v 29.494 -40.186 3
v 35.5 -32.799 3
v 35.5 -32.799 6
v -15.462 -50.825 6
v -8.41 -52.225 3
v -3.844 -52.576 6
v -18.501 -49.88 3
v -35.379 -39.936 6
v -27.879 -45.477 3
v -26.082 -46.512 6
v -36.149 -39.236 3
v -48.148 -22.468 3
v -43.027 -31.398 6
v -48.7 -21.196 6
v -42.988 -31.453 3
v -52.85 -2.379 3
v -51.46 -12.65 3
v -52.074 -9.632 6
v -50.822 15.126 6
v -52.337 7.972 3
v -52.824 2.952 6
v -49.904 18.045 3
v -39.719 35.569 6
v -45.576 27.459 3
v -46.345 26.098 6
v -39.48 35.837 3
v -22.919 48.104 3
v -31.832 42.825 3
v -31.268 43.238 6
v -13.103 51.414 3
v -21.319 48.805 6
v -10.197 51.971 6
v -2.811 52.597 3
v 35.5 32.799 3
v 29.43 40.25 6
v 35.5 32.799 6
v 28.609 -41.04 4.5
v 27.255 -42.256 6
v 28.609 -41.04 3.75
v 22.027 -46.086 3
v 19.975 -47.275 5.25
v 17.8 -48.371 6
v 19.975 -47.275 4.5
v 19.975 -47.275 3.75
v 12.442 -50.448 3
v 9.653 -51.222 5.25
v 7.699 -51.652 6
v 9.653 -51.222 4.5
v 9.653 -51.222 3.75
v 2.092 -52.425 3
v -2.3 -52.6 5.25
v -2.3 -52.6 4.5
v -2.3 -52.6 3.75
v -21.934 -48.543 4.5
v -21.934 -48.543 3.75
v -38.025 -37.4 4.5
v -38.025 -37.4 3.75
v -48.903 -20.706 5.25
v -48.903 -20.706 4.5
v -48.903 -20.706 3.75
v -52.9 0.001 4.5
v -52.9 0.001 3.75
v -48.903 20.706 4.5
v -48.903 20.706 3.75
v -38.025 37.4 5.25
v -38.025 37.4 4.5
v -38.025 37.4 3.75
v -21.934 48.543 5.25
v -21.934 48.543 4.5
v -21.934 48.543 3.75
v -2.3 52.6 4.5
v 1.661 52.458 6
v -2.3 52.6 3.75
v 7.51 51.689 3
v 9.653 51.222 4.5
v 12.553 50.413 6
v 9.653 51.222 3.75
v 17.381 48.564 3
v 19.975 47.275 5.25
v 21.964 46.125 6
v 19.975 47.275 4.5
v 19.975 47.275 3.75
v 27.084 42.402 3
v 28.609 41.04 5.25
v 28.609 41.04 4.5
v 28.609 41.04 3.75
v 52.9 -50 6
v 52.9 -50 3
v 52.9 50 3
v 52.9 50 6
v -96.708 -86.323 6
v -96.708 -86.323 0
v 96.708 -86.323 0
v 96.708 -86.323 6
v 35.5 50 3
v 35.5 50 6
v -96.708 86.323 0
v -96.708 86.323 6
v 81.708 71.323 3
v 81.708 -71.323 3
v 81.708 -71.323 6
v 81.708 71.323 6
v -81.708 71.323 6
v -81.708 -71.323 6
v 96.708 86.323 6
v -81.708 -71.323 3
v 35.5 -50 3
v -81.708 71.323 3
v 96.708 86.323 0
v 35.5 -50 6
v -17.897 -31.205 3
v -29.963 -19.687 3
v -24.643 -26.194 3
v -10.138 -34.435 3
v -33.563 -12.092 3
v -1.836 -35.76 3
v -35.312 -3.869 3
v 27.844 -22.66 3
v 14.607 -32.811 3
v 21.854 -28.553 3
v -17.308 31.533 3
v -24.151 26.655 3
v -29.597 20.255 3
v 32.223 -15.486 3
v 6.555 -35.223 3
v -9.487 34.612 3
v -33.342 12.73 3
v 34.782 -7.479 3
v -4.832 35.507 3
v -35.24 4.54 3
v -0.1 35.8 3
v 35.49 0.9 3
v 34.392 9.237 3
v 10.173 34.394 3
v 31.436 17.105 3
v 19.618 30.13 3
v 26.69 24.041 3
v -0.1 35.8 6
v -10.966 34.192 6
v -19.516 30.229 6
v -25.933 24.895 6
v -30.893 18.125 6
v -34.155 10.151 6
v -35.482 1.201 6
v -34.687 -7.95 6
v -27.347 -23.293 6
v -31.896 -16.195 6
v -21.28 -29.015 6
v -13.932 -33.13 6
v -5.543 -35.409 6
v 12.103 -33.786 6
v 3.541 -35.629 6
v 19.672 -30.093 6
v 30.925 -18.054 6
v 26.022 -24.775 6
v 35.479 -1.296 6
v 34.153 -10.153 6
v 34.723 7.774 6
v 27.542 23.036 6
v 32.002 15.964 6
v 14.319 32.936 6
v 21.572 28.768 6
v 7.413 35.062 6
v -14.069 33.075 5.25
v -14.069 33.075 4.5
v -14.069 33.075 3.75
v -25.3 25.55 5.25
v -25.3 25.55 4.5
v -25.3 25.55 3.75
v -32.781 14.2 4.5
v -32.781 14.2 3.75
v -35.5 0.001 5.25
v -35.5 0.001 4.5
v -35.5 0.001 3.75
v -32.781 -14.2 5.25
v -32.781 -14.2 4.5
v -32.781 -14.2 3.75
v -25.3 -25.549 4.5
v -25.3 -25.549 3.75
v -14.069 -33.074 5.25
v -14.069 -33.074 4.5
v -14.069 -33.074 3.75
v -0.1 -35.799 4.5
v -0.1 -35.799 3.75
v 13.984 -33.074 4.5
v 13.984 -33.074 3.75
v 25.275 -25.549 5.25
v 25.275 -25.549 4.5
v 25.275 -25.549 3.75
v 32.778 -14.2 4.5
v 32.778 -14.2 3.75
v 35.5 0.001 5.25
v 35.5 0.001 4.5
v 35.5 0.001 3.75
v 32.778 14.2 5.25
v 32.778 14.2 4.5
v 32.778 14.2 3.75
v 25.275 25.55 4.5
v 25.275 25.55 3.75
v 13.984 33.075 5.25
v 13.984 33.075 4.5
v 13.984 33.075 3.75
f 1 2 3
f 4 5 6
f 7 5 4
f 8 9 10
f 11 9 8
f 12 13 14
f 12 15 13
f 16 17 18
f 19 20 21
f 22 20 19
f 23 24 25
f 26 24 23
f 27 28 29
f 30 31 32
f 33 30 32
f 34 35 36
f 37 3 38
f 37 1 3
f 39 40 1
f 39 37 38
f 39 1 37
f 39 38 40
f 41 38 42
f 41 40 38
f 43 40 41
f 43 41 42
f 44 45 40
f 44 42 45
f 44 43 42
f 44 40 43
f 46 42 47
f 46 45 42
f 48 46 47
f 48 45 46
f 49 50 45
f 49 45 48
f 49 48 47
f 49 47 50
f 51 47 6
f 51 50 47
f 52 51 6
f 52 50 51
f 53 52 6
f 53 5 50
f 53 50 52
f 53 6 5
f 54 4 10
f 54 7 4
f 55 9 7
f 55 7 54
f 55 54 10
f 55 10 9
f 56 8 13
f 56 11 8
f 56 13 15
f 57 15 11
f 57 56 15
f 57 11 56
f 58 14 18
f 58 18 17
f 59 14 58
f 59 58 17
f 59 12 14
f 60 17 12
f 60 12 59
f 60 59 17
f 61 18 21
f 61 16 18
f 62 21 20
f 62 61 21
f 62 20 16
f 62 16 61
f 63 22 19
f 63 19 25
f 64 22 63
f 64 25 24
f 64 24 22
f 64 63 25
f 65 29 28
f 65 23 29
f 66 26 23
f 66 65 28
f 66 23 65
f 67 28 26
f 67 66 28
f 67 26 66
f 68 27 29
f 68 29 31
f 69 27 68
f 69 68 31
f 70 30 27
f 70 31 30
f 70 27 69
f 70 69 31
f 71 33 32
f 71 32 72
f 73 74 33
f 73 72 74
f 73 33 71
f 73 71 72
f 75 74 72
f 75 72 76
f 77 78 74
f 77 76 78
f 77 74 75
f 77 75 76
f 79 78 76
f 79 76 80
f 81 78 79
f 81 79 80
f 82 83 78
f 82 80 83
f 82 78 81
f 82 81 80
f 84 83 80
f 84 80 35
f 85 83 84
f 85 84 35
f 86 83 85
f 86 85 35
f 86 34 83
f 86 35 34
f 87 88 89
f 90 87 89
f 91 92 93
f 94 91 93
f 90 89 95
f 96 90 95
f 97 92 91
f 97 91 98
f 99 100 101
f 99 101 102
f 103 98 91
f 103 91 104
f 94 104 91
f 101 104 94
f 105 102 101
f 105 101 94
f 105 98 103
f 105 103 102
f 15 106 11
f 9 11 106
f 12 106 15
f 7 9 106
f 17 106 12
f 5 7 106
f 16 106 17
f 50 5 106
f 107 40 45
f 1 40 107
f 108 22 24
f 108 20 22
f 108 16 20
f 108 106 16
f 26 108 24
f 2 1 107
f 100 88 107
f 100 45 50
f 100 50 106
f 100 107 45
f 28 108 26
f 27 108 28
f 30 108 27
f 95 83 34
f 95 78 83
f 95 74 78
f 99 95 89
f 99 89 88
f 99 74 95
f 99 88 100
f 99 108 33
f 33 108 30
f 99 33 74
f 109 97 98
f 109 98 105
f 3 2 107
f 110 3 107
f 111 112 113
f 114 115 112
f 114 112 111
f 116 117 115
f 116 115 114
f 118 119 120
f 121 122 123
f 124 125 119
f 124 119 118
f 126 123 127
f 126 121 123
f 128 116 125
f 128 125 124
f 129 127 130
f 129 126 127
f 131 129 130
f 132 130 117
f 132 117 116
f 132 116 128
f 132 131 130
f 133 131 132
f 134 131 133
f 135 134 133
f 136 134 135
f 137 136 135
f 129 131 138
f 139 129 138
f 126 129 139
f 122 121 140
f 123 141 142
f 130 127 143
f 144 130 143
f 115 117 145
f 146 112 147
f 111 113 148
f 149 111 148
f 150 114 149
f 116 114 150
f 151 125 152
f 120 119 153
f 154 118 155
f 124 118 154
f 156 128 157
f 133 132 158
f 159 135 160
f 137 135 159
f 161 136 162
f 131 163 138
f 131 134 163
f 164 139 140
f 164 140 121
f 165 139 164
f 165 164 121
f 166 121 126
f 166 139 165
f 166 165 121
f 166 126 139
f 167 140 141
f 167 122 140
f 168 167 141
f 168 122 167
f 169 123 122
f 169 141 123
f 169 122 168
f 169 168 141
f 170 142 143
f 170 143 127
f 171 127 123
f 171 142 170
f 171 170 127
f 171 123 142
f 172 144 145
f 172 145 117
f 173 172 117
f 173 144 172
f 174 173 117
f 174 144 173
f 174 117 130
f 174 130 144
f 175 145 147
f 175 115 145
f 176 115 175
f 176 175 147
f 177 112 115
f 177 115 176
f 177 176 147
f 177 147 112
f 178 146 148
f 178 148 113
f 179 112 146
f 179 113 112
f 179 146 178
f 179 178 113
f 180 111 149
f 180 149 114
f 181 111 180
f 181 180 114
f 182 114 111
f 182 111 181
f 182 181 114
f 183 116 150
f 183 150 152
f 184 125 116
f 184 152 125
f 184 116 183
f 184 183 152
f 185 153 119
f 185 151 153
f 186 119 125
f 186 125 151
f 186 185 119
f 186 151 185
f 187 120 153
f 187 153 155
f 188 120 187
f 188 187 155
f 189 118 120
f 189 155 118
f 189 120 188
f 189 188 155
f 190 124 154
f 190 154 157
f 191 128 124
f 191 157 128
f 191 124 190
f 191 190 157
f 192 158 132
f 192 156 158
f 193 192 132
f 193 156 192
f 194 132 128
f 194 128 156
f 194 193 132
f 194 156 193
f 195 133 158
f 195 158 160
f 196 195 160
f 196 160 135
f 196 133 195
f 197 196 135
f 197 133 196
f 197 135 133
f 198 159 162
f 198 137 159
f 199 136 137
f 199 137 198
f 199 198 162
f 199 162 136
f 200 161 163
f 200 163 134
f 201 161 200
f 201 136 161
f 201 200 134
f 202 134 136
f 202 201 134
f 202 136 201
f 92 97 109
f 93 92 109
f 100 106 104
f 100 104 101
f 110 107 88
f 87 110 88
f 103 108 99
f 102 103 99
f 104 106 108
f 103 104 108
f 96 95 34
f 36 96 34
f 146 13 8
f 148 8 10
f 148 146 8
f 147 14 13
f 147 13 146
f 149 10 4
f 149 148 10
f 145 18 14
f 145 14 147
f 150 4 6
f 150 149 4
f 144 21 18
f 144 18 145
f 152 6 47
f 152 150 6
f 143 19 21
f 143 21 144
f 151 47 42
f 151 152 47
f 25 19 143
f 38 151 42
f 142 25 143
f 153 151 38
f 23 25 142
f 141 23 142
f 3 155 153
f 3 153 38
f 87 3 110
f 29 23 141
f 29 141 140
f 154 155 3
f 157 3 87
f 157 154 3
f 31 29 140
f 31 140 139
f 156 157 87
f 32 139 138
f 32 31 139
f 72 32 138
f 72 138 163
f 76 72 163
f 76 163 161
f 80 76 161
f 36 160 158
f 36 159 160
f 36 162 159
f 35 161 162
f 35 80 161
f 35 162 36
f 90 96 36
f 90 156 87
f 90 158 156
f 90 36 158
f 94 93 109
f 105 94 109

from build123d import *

# Parameters (mm, degrees)
F0_W     = 193.4158557523
F0_H     = 172.6455353569
F0_W_2   = 163.4158582486
F0_H_2   = 142.6455378532
F1_DEPTH = 3
F2_DEPTH = 6


with BuildPart() as f1:
    # F0 (on Top) → F1 (new body)
    with BuildSketch(Plane.XY):
        Rectangle(F0_W, F0_H)
        Rectangle(F0_W_2, F0_H_2, mode=Mode.SUBTRACT)
        Rectangle(F0_W_2, F0_H_2)
        with BuildLine():
            Line((35.4995967874, 50.0004287687), (52.8996007893, 50.0004287687))
            Line((52.8996007893, 50.0004287687), (52.8996007893, -49.9995712313))
            Line((52.8996007893, -49.9995712313), (35.4995967874, -49.9995712313))
            Line((35.4995967874, -49.9995712313), (35.4995967874, -32.7993734261))
            add(Edge.make_bspline(
                [(35.4995967874, -32.7993734261), (27.4996310889, -45.0001286306), (14.6994572947, -52.5996243987), (-2.3000767767, -52.5996243987)],
                knots=[0, 0, 0, 0, 1, 1, 1, 1], degree=3))
            add(Edge.make_bspline(
                [(-2.3000767767, -52.5996243987), (-30.1002934478, -52.5996243987), (-52.8996382893, -29.5999016691), (-52.8996382893, 0.0005716915)],
                knots=[0, 0, 0, 0, 1, 1, 1, 1], degree=3))
            add(Edge.make_bspline(
                [(-52.8996382893, 0.0005716915), (-52.8996382893, 29.5999016691), (-30.1002934478, 52.5996243987), (-2.3000767767, 52.5996243987)],
                knots=[0, 0, 0, 0, 1, 1, 1, 1], degree=3))
            add(Edge.make_bspline(
                [(-2.3000767767, 52.5996243987), (14.6994572947, 52.5996243987), (27.4996310889, 45.0001286306), (35.4995967874, 32.7993734261)],
                knots=[0, 0, 0, 0, 1, 1, 1, 1], degree=3))
            Line((35.4995967874, 32.7993734261), (35.4995967874, 50.0004287687))
        make_face(mode=Mode.SUBTRACT)
        with BuildLine():
            Line((52.8996007893, -49.9995712313), (52.8996007893, 50.0004287687))
            Line((52.8996007893, 50.0004287687), (35.4995967874, 50.0004287687))
            Line((35.4995967874, 50.0004287687), (35.4995967874, 32.7993734261))
            add(Edge.make_bspline(
                [(-2.3000767767, 52.5996243987), (14.6994572947, 52.5996243987), (27.4996310889, 45.0001286306), (35.4995967874, 32.7993734261)],
                knots=[0, 0, 0, 0, 1, 1, 1, 1], degree=3))
            add(Edge.make_bspline(
                [(-52.8996382893, 0.0005716915), (-52.8996382893, 29.5999016691), (-30.1002934478, 52.5996243987), (-2.3000767767, 52.5996243987)],
                knots=[0, 0, 0, 0, 1, 1, 1, 1], degree=3))
            add(Edge.make_bspline(
                [(-2.3000767767, -52.5996243987), (-30.1002934478, -52.5996243987), (-52.8996382893, -29.5999016691), (-52.8996382893, 0.0005716915)],
                knots=[0, 0, 0, 0, 1, 1, 1, 1], degree=3))
            add(Edge.make_bspline(
                [(35.4995967874, -32.7993734261), (27.4996310889, -45.0001286306), (14.6994572947, -52.5996243987), (-2.3000767767, -52.5996243987)],
                knots=[0, 0, 0, 0, 1, 1, 1, 1], degree=3))
            Line((35.4995967874, -32.7993734261), (35.4995967874, -49.9995712313))
            Line((35.4995967874, -49.9995712313), (52.8996007893, -49.9995712313))
        make_face()
        with BuildLine():
            add(Edge.make_bspline(
                [(35.4995967874, 0.0005716915), (35.4995967874, 20.4002412538), (20.0996556717, 35.8001823696), (-0.1002076941, 35.8001823696)],
                knots=[0, 0, 0, 0, 1, 1, 1, 1], degree=3))
            add(Edge.make_bspline(
                [(-0.1002076941, -35.7990389865), (20.0996556717, -35.7990389865), (35.4995967874, -20.3999554081), (35.4995967874, 0.0005716915)],
                knots=[0, 0, 0, 0, 1, 1, 1, 1], degree=3))
            add(Edge.make_bspline(
                [(-35.4996342874, 0.0005716915), (-35.4996342874, -20.3999554081), (-20.1002648632, -35.7990389865), (-0.1002076941, -35.7990389865)],
                knots=[0, 0, 0, 0, 1, 1, 1, 1], degree=3))
            add(Edge.make_bspline(
                [(-0.1002076941, 35.8001823696), (-20.1002648632, 35.8001823696), (-35.4996342874, 20.4002412538), (-35.4996342874, 0.0005716915)],
                knots=[0, 0, 0, 0, 1, 1, 1, 1], degree=3))
        make_face(mode=Mode.SUBTRACT)
        with BuildLine():
            add(Edge.make_bspline(
                [(-0.1002076941, -35.7990389865), (20.0996556717, -35.7990389865), (35.4995967874, -20.3999554081), (35.4995967874, 0.0005716915)],
                knots=[0, 0, 0, 0, 1, 1, 1, 1], degree=3))
            add(Edge.make_bspline(
                [(35.4995967874, 0.0005716915), (35.4995967874, 20.4002412538), (20.0996556717, 35.8001823696), (-0.1002076941, 35.8001823696)],
                knots=[0, 0, 0, 0, 1, 1, 1, 1], degree=3))
            add(Edge.make_bspline(
                [(-0.1002076941, 35.8001823696), (-20.1002648632, 35.8001823696), (-35.4996342874, 20.4002412538), (-35.4996342874, 0.0005716915)],
                knots=[0, 0, 0, 0, 1, 1, 1, 1], degree=3))
            add(Edge.make_bspline(
                [(-35.4996342874, 0.0005716915), (-35.4996342874, -20.3999554081), (-20.1002648632, -35.7990389865), (-0.1002076941, -35.7990389865)],
                knots=[0, 0, 0, 0, 1, 1, 1, 1], degree=3))
        make_face()
    extrude(amount=F1_DEPTH)

    # F0 (on Top) → F2 (join)
    with BuildSketch(Plane.XY):
        Rectangle(F0_W, F0_H)
        Rectangle(F0_W_2, F0_H_2, mode=Mode.SUBTRACT)
        with BuildLine():
            Line((52.8996007893, -49.9995712313), (52.8996007893, 50.0004287687))
            Line((52.8996007893, 50.0004287687), (35.4995967874, 50.0004287687))
            Line((35.4995967874, 50.0004287687), (35.4995967874, 32.7993734261))
            add(Edge.make_bspline(
                [(-2.3000767767, 52.5996243987), (14.6994572947, 52.5996243987), (27.4996310889, 45.0001286306), (35.4995967874, 32.7993734261)],
                knots=[0, 0, 0, 0, 1, 1, 1, 1], degree=3))
            add(Edge.make_bspline(
                [(-52.8996382893, 0.0005716915), (-52.8996382893, 29.5999016691), (-30.1002934478, 52.5996243987), (-2.3000767767, 52.5996243987)],
                knots=[0, 0, 0, 0, 1, 1, 1, 1], degree=3))
            add(Edge.make_bspline(
                [(-2.3000767767, -52.5996243987), (-30.1002934478, -52.5996243987), (-52.8996382893, -29.5999016691), (-52.8996382893, 0.0005716915)],
                knots=[0, 0, 0, 0, 1, 1, 1, 1], degree=3))
            add(Edge.make_bspline(
                [(35.4995967874, -32.7993734261), (27.4996310889, -45.0001286306), (14.6994572947, -52.5996243987), (-2.3000767767, -52.5996243987)],
                knots=[0, 0, 0, 0, 1, 1, 1, 1], degree=3))
            Line((35.4995967874, -32.7993734261), (35.4995967874, -49.9995712313))
            Line((35.4995967874, -49.9995712313), (52.8996007893, -49.9995712313))
        make_face()
        with BuildLine():
            add(Edge.make_bspline(
                [(35.4995967874, 0.0005716915), (35.4995967874, 20.4002412538), (20.0996556717, 35.8001823696), (-0.1002076941, 35.8001823696)],
                knots=[0, 0, 0, 0, 1, 1, 1, 1], degree=3))
            add(Edge.make_bspline(
                [(-0.1002076941, -35.7990389865), (20.0996556717, -35.7990389865), (35.4995967874, -20.3999554081), (35.4995967874, 0.0005716915)],
                knots=[0, 0, 0, 0, 1, 1, 1, 1], degree=3))
            add(Edge.make_bspline(
                [(-35.4996342874, 0.0005716915), (-35.4996342874, -20.3999554081), (-20.1002648632, -35.7990389865), (-0.1002076941, -35.7990389865)],
                knots=[0, 0, 0, 0, 1, 1, 1, 1], degree=3))
            add(Edge.make_bspline(
                [(-0.1002076941, 35.8001823696), (-20.1002648632, 35.8001823696), (-35.4996342874, 20.4002412538), (-35.4996342874, 0.0005716915)],
                knots=[0, 0, 0, 0, 1, 1, 1, 1], degree=3))
        make_face(mode=Mode.SUBTRACT)
    extrude(amount=F2_DEPTH)


solid = f1.part
